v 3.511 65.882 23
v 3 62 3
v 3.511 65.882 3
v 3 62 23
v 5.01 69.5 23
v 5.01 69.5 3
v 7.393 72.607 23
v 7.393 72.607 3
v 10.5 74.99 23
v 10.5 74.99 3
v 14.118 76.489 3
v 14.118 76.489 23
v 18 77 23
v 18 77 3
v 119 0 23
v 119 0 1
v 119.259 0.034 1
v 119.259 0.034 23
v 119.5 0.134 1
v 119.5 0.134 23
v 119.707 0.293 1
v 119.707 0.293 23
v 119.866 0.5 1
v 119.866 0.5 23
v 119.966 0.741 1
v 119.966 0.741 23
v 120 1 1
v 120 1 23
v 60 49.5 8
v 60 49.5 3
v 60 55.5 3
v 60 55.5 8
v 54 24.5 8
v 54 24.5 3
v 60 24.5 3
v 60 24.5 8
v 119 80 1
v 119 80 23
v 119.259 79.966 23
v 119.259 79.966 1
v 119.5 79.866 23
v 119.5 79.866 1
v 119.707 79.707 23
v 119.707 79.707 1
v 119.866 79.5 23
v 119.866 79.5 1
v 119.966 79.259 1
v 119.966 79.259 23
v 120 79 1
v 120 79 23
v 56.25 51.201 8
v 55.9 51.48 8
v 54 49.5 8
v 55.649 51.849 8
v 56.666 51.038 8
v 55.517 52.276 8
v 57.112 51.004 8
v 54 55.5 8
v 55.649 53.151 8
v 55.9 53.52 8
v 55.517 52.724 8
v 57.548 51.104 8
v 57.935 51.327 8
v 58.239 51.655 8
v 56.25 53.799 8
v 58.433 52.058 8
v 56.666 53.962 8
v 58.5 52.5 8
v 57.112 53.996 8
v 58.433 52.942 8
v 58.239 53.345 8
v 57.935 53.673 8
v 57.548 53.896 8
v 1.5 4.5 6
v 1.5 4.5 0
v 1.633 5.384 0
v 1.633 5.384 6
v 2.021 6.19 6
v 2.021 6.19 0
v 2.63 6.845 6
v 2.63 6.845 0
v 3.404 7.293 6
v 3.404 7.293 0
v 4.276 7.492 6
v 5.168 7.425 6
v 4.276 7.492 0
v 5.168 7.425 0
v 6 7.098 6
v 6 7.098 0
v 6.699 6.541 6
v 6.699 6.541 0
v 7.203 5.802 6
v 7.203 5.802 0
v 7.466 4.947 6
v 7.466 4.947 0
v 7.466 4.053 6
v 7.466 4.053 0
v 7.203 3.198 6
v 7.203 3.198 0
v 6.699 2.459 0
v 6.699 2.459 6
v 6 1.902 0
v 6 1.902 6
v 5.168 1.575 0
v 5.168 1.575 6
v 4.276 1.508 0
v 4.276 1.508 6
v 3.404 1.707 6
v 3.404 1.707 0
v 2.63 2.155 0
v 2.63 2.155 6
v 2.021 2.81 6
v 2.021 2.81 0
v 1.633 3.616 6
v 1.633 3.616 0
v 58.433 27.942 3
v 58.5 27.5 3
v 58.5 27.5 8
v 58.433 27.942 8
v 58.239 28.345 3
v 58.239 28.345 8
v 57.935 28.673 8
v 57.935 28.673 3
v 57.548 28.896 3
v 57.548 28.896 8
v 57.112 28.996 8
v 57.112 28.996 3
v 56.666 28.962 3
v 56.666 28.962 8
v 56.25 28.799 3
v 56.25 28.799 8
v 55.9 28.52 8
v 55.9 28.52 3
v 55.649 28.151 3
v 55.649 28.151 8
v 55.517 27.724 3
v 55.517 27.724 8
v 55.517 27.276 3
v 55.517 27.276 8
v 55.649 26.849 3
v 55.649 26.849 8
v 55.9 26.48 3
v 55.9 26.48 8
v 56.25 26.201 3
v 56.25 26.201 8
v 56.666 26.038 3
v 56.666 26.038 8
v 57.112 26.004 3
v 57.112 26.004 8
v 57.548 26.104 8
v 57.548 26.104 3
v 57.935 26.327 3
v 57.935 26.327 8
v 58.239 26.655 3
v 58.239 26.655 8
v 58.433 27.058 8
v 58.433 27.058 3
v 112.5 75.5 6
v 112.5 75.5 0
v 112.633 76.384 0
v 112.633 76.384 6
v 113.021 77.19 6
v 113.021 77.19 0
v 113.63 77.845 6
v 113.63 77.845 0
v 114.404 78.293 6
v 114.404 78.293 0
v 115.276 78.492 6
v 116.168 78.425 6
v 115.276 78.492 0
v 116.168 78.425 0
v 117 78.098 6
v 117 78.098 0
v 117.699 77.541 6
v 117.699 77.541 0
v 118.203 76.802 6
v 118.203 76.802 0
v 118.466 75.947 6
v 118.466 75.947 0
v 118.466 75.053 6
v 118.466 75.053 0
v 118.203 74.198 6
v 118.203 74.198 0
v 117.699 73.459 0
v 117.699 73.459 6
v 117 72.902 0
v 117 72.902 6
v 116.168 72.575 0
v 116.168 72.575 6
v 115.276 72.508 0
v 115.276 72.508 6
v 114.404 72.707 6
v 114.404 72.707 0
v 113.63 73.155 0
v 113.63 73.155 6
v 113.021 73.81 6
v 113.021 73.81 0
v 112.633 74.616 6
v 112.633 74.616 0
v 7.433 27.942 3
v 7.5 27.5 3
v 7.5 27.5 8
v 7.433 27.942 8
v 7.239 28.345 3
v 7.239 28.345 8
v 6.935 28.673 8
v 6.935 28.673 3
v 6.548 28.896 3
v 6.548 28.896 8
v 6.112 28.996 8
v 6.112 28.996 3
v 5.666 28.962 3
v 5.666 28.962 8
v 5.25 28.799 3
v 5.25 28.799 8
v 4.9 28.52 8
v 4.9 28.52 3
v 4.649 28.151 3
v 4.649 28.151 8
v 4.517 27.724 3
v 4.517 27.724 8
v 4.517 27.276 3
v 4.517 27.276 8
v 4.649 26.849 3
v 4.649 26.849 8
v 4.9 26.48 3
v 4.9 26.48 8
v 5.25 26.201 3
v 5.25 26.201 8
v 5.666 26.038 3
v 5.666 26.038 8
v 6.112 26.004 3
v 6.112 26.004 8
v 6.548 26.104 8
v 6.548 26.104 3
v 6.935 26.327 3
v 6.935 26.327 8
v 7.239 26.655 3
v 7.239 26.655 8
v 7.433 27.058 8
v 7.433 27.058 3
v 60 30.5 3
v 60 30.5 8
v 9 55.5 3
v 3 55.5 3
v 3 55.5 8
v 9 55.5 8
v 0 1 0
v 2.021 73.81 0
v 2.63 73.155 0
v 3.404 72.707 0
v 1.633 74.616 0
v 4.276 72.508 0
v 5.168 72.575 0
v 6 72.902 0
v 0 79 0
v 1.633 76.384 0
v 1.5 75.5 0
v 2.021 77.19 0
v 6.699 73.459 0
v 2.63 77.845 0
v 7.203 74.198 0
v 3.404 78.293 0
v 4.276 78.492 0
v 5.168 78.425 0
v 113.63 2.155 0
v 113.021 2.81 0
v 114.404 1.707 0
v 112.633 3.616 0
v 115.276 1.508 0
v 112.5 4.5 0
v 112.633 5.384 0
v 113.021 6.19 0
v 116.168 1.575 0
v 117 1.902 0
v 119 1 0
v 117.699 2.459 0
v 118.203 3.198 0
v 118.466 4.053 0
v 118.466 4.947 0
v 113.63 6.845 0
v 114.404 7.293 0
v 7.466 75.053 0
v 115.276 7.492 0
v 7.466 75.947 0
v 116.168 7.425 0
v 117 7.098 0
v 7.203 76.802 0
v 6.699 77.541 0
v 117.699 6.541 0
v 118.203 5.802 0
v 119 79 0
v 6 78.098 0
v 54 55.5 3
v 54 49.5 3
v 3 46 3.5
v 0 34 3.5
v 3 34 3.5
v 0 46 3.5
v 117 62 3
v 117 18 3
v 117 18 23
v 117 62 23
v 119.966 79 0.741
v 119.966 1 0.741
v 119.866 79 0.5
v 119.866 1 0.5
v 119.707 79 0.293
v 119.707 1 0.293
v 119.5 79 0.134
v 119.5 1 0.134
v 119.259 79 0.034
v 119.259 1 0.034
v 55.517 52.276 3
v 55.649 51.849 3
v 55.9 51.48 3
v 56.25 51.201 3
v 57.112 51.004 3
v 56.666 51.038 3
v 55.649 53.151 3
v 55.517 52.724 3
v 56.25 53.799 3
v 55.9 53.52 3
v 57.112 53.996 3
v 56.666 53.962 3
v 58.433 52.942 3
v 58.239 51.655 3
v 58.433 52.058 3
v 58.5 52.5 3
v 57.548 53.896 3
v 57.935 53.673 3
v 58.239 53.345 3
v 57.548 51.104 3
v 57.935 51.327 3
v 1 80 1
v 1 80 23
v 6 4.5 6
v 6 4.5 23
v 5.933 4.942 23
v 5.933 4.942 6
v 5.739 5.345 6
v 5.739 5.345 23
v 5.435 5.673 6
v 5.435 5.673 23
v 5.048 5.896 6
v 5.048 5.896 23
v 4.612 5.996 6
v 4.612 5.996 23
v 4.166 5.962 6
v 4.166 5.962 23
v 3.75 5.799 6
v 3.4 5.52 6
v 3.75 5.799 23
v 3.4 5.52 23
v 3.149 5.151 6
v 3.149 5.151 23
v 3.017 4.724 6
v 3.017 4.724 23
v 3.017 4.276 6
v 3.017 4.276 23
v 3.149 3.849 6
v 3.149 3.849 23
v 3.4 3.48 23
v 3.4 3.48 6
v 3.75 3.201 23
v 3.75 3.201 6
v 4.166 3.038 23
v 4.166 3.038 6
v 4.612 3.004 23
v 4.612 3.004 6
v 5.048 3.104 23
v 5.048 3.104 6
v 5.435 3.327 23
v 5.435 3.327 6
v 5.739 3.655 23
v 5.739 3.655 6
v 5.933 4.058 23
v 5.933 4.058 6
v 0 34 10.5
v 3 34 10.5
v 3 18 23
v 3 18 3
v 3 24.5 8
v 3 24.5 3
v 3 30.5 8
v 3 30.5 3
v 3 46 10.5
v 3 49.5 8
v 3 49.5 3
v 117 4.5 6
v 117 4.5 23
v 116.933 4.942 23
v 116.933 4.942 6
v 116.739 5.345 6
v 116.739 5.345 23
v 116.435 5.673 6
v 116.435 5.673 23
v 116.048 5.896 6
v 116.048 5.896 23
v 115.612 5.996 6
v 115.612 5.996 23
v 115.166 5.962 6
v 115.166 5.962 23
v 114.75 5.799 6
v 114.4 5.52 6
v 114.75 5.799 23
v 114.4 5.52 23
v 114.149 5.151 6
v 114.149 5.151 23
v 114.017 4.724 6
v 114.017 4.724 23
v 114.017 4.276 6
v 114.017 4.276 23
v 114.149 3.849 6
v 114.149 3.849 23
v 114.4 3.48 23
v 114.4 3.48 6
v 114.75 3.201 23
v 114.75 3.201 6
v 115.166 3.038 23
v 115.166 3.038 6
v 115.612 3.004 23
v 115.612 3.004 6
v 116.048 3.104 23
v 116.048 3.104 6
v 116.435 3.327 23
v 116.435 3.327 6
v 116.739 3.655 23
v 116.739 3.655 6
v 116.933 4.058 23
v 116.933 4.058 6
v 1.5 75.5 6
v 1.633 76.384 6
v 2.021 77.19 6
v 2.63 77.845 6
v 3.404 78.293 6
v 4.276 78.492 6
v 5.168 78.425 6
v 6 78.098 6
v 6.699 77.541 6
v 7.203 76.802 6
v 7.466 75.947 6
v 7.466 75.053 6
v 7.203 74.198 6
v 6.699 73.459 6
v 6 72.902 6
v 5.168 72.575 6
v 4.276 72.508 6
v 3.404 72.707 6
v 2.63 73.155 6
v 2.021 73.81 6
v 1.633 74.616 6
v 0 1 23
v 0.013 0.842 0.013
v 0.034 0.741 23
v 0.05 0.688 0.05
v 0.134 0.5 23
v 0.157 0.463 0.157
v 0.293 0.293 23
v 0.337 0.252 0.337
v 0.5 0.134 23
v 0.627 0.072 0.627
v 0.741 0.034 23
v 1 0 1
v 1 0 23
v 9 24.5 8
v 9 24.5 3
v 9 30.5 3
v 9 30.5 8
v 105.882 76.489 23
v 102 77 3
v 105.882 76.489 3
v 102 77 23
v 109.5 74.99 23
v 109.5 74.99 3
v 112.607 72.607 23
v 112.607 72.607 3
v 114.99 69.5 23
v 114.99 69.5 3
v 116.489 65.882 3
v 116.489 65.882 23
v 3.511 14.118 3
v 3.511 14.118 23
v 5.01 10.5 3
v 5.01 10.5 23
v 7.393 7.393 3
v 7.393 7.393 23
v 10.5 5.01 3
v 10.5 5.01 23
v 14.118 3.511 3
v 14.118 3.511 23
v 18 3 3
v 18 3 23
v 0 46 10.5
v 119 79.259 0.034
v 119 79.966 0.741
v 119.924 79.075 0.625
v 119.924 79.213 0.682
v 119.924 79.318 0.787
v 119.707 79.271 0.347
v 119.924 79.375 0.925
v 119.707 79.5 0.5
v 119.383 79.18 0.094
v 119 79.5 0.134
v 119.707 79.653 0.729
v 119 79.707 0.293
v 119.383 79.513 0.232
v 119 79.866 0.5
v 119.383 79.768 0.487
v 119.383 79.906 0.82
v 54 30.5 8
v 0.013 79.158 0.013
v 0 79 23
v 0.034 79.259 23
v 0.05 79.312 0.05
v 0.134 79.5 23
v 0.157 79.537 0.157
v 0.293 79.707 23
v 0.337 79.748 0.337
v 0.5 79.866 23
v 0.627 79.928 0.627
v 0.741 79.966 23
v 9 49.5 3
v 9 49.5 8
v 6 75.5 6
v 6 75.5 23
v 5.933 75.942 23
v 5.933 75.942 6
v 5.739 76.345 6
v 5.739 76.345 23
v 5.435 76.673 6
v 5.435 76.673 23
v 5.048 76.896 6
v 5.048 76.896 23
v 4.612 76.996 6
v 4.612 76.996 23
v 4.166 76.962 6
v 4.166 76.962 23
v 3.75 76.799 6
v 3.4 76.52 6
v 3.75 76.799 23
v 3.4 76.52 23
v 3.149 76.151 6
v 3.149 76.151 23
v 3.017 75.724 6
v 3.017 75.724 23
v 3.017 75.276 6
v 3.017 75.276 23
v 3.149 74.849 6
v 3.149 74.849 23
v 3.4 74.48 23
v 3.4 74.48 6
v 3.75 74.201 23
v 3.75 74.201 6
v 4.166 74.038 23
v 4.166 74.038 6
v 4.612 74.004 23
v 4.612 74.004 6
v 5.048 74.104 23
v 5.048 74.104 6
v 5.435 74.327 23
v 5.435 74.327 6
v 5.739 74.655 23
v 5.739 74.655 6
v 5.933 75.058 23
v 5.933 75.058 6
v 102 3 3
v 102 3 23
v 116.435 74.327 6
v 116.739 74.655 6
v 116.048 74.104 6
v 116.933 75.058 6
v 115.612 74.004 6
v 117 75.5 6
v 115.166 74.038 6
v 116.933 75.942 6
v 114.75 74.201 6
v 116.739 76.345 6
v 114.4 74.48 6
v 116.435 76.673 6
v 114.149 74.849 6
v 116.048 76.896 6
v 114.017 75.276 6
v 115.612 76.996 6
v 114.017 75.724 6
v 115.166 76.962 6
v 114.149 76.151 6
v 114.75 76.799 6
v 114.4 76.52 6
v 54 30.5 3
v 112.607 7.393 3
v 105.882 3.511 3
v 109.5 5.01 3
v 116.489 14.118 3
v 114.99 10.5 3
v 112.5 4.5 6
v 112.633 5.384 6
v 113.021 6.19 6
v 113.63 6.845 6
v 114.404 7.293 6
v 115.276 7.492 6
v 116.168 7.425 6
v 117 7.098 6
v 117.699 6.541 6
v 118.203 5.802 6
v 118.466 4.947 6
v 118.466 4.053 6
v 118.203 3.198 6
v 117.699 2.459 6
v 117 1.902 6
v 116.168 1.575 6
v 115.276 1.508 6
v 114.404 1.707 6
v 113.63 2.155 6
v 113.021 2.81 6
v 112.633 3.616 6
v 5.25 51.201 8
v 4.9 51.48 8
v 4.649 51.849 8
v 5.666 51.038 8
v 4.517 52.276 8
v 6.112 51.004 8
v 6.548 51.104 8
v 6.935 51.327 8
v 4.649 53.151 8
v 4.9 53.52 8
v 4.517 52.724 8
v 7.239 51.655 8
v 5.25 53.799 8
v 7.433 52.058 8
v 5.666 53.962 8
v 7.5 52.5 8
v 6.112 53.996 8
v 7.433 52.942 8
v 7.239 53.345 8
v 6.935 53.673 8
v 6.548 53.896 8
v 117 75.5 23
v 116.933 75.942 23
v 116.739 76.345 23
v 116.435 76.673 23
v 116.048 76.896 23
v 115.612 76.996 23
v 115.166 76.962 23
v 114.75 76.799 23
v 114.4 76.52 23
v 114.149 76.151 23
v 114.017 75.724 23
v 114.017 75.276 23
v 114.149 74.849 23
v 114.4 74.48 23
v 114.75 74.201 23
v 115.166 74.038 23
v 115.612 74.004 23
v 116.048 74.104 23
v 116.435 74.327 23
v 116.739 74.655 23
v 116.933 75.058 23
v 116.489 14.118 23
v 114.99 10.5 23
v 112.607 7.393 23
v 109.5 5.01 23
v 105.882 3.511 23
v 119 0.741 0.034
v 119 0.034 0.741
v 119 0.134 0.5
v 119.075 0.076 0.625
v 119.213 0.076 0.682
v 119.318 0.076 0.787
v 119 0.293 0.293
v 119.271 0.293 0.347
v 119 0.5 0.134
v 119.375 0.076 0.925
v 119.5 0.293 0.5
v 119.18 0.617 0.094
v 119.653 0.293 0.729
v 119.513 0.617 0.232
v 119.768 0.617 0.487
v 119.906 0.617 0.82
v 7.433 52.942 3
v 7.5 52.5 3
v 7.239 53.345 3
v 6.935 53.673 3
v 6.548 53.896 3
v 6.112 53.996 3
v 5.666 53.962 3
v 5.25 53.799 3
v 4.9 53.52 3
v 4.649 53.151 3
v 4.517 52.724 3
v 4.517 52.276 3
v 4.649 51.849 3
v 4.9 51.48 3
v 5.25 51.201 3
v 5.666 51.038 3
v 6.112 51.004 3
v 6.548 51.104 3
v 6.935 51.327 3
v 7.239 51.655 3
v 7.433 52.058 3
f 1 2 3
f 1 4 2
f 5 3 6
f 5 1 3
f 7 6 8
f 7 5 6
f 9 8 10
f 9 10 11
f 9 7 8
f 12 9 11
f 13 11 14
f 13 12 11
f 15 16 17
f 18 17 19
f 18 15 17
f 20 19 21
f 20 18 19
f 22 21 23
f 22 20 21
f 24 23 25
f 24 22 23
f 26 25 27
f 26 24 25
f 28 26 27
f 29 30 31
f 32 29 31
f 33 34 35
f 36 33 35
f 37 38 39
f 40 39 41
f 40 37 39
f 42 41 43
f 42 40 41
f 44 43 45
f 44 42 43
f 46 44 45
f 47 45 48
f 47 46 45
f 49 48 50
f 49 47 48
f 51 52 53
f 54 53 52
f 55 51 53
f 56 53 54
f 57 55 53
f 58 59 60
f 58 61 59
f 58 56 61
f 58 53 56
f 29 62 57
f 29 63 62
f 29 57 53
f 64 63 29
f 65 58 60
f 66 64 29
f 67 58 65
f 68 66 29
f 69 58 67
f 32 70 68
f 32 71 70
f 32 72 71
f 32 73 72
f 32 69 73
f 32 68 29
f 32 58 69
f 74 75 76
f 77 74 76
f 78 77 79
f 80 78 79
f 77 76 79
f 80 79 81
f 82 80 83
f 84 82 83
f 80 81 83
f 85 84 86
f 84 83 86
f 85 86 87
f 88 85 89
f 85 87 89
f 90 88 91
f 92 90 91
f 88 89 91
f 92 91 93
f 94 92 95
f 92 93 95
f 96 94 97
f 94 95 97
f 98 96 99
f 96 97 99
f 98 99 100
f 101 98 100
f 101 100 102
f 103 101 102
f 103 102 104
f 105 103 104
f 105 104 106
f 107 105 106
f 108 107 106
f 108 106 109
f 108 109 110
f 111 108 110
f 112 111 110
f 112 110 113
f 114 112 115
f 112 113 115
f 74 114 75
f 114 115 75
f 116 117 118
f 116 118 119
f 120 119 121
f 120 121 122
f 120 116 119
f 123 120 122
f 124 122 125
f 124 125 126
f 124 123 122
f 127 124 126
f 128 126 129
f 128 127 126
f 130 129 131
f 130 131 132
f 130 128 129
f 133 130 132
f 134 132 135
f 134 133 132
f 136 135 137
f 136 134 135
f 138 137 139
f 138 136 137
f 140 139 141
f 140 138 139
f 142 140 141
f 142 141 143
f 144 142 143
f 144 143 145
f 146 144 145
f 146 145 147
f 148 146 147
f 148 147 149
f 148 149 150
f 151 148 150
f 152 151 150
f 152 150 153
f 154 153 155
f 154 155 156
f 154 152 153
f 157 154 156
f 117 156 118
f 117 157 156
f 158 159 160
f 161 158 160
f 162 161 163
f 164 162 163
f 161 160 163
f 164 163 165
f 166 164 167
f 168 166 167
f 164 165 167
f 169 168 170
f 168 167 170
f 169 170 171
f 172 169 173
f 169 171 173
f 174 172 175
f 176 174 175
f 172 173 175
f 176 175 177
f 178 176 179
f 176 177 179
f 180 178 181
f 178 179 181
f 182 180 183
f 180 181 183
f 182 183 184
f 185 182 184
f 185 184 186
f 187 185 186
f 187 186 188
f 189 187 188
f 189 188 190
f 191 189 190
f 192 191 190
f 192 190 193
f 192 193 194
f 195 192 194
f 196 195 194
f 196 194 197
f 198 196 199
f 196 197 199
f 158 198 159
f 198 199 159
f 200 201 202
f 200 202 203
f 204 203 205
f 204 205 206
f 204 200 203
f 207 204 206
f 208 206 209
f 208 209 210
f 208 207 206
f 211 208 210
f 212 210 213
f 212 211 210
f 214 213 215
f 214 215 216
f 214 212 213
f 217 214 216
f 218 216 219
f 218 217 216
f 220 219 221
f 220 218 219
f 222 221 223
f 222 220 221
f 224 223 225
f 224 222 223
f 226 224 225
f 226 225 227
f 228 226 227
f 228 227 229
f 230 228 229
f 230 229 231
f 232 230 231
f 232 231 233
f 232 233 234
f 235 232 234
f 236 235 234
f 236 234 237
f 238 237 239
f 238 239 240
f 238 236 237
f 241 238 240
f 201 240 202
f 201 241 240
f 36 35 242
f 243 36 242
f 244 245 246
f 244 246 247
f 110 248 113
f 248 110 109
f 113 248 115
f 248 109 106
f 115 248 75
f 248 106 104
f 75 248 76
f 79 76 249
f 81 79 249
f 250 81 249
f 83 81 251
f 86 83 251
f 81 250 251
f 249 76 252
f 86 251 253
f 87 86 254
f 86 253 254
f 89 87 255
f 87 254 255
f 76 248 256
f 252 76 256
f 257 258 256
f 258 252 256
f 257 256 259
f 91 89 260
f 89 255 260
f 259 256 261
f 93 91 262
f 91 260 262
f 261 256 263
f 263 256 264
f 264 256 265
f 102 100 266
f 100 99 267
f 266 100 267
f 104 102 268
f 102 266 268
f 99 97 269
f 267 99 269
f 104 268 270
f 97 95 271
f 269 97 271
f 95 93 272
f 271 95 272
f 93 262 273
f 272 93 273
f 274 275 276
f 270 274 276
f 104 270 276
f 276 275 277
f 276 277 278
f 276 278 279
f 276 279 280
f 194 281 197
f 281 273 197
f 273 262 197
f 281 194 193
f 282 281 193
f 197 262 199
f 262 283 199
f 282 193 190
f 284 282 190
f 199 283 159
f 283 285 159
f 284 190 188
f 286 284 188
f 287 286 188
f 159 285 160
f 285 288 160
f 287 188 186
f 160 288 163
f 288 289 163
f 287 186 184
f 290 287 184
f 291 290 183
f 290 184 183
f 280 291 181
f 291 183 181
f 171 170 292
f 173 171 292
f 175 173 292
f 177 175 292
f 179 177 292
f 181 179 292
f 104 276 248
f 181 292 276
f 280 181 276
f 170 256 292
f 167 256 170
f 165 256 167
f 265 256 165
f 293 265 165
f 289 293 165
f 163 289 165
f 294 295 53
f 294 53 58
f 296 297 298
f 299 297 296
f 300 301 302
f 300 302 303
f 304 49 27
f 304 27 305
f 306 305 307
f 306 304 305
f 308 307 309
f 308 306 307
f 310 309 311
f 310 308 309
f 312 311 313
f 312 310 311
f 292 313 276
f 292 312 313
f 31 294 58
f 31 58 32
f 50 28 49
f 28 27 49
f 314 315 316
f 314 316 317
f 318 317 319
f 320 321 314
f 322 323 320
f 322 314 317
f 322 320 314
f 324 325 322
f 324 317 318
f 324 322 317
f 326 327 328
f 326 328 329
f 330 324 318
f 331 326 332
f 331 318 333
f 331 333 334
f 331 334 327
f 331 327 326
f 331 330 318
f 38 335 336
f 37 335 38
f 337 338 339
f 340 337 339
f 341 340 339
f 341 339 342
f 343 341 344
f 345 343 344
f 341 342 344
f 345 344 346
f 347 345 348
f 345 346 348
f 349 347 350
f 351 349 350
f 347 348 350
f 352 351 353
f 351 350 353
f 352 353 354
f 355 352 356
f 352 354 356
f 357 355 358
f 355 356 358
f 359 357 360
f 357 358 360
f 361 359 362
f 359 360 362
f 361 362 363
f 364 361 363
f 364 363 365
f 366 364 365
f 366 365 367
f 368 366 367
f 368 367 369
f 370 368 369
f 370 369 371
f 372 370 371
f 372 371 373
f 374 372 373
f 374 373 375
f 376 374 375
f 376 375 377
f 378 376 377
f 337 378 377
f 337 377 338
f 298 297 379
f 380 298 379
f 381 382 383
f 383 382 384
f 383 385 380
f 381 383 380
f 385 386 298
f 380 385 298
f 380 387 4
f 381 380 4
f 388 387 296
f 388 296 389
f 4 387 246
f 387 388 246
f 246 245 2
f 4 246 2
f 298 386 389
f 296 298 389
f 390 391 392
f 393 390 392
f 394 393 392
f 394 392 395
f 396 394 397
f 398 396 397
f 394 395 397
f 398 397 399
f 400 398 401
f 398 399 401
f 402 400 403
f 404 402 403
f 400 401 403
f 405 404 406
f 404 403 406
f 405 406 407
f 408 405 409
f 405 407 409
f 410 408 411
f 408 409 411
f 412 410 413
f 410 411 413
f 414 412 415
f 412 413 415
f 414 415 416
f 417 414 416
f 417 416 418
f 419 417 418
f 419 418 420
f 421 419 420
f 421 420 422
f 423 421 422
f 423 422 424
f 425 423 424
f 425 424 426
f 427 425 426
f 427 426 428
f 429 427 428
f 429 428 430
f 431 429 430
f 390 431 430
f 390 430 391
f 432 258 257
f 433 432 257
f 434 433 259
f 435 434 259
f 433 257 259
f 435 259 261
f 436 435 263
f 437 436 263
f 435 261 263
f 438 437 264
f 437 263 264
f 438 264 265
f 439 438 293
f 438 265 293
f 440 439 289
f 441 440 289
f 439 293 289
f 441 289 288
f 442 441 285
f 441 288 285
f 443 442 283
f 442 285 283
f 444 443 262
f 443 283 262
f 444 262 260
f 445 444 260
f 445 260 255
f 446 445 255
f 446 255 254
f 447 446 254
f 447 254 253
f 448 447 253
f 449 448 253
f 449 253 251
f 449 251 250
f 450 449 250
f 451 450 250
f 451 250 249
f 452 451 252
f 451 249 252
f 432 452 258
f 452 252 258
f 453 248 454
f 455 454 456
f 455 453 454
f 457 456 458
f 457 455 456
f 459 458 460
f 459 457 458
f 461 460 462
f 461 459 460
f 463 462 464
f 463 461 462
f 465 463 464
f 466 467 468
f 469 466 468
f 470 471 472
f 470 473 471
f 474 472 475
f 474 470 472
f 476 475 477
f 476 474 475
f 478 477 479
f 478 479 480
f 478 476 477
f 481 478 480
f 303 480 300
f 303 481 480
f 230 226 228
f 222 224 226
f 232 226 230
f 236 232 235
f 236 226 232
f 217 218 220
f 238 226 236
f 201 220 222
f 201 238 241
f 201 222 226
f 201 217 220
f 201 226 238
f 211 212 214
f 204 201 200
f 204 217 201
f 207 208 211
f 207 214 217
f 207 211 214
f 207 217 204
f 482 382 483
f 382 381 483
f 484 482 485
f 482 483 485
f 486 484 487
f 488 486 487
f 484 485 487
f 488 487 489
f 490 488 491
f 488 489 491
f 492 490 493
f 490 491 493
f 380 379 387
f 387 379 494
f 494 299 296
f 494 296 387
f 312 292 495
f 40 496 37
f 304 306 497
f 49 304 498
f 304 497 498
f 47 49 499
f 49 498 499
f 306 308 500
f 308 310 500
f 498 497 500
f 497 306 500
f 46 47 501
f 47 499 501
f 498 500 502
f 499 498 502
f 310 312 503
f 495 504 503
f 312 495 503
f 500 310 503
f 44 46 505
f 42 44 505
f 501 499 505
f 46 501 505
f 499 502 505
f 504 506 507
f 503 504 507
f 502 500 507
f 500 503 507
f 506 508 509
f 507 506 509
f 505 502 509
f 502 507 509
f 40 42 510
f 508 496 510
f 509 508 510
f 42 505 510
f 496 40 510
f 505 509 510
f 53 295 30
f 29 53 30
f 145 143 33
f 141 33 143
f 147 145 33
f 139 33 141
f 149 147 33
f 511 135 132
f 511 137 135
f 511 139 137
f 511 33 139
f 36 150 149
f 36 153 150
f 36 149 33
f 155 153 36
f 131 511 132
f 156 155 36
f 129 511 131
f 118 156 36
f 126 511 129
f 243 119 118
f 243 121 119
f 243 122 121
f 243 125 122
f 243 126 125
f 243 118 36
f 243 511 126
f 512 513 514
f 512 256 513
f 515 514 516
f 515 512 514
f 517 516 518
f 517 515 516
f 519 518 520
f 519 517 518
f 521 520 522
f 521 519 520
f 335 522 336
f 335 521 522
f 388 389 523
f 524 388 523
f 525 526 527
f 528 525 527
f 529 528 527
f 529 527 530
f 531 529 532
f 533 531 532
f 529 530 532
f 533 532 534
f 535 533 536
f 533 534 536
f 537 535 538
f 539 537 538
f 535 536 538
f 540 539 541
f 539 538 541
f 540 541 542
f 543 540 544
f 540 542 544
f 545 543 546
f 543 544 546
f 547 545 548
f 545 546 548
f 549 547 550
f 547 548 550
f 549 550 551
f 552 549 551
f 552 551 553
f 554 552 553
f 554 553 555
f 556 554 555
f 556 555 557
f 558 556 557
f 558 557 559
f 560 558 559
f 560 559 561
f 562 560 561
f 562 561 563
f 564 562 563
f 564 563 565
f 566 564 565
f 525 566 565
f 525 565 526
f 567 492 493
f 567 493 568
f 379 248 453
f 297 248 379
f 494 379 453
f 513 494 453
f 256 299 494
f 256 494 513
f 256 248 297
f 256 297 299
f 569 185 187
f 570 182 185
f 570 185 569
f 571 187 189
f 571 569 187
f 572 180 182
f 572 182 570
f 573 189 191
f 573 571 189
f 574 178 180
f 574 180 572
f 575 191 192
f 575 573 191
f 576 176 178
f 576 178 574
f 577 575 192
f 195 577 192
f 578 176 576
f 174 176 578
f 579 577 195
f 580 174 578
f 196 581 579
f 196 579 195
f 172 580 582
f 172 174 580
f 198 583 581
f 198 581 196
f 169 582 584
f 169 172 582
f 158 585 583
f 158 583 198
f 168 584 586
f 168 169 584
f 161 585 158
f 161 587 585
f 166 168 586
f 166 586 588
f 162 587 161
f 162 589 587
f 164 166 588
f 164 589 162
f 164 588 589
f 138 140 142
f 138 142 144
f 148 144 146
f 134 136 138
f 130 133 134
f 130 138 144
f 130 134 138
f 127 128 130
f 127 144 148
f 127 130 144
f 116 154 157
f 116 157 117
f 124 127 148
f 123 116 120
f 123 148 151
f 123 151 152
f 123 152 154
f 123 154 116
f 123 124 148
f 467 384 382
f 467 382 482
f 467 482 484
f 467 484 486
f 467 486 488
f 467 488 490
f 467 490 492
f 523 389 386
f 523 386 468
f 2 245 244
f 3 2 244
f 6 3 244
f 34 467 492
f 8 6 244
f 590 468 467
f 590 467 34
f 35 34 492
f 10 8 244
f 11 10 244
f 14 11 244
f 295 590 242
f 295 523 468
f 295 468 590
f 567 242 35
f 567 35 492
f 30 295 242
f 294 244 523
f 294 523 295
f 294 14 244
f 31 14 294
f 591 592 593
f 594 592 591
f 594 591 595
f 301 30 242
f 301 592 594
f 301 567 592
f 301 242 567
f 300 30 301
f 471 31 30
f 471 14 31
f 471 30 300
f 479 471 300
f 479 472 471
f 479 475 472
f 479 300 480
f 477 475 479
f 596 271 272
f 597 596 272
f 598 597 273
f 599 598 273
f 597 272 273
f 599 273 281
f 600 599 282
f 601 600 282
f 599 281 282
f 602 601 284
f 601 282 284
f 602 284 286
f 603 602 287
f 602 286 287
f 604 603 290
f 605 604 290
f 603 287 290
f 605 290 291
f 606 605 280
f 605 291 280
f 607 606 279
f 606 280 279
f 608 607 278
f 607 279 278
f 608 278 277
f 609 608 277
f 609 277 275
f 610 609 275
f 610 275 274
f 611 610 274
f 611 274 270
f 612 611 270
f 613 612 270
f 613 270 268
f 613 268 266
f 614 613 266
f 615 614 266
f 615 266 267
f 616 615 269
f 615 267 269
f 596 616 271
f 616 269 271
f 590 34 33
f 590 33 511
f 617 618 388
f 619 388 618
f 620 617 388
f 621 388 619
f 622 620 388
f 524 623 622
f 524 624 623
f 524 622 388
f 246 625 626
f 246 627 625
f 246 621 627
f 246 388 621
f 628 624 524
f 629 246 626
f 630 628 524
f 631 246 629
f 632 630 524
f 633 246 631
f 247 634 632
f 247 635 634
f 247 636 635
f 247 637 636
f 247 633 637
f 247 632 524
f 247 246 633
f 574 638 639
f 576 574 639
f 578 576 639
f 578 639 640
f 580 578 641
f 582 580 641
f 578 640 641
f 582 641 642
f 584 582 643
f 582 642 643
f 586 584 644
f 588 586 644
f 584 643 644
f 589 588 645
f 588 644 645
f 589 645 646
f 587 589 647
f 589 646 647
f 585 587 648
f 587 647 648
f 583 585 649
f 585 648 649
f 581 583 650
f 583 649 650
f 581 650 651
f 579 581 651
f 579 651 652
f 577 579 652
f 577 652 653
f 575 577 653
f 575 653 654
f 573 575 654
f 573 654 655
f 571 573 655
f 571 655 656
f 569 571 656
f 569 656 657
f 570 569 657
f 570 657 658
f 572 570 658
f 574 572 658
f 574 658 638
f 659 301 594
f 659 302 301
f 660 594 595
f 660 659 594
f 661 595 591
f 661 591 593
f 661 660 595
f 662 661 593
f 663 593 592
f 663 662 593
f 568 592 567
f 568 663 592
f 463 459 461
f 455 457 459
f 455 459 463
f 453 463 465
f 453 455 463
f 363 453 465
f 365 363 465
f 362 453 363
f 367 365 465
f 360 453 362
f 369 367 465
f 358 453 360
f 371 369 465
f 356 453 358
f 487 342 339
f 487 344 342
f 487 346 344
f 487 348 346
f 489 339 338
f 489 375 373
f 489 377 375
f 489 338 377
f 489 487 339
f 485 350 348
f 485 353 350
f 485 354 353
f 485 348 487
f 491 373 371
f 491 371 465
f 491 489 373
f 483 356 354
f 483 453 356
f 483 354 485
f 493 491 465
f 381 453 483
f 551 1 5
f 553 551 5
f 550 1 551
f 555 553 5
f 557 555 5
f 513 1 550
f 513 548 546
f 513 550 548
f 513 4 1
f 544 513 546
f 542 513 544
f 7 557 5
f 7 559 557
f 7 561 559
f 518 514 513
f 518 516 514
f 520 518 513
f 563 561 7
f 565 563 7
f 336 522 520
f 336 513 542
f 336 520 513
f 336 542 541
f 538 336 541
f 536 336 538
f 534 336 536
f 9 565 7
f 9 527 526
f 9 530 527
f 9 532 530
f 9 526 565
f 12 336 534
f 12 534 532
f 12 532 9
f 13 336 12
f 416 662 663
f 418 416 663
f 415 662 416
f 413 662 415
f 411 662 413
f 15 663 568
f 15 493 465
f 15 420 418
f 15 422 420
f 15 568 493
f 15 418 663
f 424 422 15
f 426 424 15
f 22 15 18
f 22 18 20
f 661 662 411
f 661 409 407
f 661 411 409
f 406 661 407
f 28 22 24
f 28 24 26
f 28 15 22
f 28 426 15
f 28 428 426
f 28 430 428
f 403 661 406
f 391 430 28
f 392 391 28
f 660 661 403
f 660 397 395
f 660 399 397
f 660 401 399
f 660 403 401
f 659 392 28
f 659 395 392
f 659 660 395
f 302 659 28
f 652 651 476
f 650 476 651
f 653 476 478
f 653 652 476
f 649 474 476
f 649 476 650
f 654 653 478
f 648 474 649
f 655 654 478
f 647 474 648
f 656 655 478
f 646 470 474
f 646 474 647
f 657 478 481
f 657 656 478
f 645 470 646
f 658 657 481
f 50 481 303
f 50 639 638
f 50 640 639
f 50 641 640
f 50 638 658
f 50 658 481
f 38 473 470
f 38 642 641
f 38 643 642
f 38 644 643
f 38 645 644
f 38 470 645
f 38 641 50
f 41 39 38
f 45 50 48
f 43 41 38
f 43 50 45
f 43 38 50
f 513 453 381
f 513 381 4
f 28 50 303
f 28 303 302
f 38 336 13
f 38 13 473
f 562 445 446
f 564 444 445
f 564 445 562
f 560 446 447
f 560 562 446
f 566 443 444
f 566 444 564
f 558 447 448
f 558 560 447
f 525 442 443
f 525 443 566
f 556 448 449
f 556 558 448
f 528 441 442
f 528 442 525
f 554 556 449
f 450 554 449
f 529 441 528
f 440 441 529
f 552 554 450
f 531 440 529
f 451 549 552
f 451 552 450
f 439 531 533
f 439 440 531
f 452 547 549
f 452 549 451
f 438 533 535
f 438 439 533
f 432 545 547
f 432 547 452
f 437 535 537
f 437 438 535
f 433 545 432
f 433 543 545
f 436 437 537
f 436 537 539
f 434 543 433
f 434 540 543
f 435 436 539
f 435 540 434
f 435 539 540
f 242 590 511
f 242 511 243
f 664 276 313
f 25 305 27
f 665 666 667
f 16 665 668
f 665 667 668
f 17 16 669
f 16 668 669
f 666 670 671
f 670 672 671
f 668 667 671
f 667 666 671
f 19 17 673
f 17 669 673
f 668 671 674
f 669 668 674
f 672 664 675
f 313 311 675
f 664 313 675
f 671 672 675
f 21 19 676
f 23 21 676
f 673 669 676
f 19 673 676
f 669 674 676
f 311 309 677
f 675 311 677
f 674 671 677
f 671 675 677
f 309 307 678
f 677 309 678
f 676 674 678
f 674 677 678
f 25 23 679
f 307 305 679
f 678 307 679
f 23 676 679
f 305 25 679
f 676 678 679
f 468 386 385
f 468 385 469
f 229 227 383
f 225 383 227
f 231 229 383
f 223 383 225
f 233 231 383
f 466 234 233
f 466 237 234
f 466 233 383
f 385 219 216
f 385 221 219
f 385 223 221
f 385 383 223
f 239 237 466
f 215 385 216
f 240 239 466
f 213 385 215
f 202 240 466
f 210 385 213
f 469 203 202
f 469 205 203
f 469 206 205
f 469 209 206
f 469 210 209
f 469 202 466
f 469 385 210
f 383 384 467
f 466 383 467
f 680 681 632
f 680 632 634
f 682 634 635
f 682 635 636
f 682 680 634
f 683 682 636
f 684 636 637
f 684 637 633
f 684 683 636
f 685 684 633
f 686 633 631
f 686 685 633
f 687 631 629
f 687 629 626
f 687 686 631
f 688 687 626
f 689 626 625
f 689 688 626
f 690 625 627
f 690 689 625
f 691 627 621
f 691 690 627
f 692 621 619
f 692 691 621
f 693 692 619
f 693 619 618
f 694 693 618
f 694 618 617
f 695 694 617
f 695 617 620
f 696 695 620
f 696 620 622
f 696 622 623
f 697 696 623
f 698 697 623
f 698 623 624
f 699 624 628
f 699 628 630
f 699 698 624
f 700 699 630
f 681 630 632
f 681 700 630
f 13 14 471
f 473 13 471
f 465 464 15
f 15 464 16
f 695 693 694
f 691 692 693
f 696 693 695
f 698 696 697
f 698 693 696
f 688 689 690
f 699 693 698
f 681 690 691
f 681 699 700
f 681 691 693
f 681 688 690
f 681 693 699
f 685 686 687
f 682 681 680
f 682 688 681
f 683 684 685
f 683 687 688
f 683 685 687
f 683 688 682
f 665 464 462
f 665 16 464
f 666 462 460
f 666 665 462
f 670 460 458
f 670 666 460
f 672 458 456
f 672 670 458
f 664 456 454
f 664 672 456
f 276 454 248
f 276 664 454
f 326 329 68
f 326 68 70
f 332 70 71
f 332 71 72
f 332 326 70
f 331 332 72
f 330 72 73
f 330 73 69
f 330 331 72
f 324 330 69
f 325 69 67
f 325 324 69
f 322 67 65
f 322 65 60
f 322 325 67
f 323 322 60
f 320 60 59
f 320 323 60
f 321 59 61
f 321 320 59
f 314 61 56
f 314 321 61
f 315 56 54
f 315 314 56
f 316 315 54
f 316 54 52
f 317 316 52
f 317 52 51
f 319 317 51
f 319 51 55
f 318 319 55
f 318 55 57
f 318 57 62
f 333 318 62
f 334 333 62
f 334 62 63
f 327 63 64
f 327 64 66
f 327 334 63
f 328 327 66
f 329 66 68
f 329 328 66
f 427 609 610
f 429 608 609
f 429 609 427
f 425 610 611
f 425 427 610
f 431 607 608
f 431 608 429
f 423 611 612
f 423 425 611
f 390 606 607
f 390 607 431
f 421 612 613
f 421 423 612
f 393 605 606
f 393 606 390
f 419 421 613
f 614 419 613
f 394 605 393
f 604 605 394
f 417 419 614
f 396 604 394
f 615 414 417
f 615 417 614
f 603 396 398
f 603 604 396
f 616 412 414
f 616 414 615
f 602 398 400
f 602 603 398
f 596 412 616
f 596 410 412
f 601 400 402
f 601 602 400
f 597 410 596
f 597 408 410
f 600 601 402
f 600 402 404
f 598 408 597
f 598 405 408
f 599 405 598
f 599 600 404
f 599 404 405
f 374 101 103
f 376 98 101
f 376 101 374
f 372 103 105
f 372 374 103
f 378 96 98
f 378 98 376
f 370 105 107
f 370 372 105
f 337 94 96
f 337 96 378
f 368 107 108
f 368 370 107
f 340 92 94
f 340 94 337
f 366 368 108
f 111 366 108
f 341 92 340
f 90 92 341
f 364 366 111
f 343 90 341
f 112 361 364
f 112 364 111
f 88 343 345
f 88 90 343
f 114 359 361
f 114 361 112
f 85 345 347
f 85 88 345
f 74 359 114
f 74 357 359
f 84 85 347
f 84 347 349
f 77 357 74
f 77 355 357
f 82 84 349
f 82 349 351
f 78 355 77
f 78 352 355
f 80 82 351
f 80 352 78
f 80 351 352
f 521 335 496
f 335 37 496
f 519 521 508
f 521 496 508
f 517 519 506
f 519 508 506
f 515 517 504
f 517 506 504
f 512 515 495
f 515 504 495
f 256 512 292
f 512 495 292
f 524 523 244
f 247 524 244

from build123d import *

# Parameters (mm, degrees)
ESQUISSE1_W             = 120
ESQUISSE1_H             = 80
BOSS_EXTRU_1_DEPTH      = 3
ESQUISSE4_W             = 120
ESQUISSE4_H             = 80
ESQUISSE4_W_2           = 114
ESQUISSE4_H_2           = 74
BOSS_EXTRU_3_DEPTH      = 20
CONG_1_R                = 15
ESQUISSE5_R             = 1.5
ENL_V_MAT_EXTRU_1_DEPTH = 147.044513762
ESQUISSE7_R             = 3
ENL_V_MAT_EXTRU_3_DEPTH = 6
ESQUISSE8_W             = 6
ESQUISSE8_H             = 6
ESQUISSE8_R             = 1.5
BOSS_EXTRU_4_DEPTH      = 5
ENL_V_MAT_EXTRU_4_REACH = 148.045
ESQUISSE9_W             = 7
ESQUISSE9_H             = 12
CONG_3_R                = 1


with BuildPart() as part:
    # Esquisse1 → Boss.-Extru.1 (new body)
    with BuildSketch(Plane.XY):
        with Locations((60, 40)):
            Rectangle(ESQUISSE1_W, ESQUISSE1_H)
    extrude(amount=BOSS_EXTRU_1_DEPTH)

    # Esquisse4 → Boss.-Extru.3 (add)
    with BuildSketch(Plane.XY.offset(3)):
        with Locations((60, 40)):
            Rectangle(ESQUISSE4_W, ESQUISSE4_H)
        with Locations((60, 40)):
            Rectangle(ESQUISSE4_W_2, ESQUISSE4_H_2, mode=Mode.SUBTRACT)
    extrude(amount=BOSS_EXTRU_3_DEPTH)

    # Congé1
    cong_1_edges = [part.edges().sort_by_distance(p)[0] for p in [
        (3, 3, 13),
        (117, 3, 13),
        (117, 77, 13),
        (3, 77, 13),
    ]]
    fillet(cong_1_edges, radius=CONG_1_R)

    # Esquisse5 → Enlèv. mat.-Extru.1 (cut, through all)
    with BuildSketch(Plane.XY.offset(23)):
        with Locations((4.5, 75.5)):
            Circle(ESQUISSE5_R)
        with Locations((115.5, 75.5)):
            Circle(ESQUISSE5_R)
        with Locations((115.5, 4.5)):
            Circle(ESQUISSE5_R)
        with Locations((4.5, 4.5)):
            Circle(ESQUISSE5_R)
    extrude(amount=-ENL_V_MAT_EXTRU_1_DEPTH, mode=Mode.SUBTRACT)

    # Esquisse7 → Enlèv. mat.-Extru.3 (cut)
    with BuildSketch(Plane(origin=(0, 0, 0), x_dir=(-1, 0, 0), z_dir=(0, 0, -1))):
        with Locations((-115.5, 75.5)):
            Circle(ESQUISSE7_R)
        with Locations((-4.5, 75.5)):
            Circle(ESQUISSE7_R)
        with Locations((-4.5, 4.5)):
            Circle(ESQUISSE7_R)
        with Locations((-115.5, 4.5)):
            Circle(ESQUISSE7_R)
    extrude(amount=-ENL_V_MAT_EXTRU_3_DEPTH, mode=Mode.SUBTRACT)

    # Esquisse8 → Boss.-Extru.4 (add)
    # profile 1 of 4: a face of its own
    with BuildSketch(Plane.XY.offset(3)):
        with Locations((6, 52.5)):
            Rectangle(ESQUISSE8_W, ESQUISSE8_H)
        with Locations((6, 52.5)):
            Circle(ESQUISSE8_R, mode=Mode.SUBTRACT)
    # profile 2 of 4: a face of its own
    with BuildSketch(Plane.XY.offset(3)):
        with Locations((57, 52.5)):
            Rectangle(ESQUISSE8_W, ESQUISSE8_H)
        with Locations((57, 52.5)):
            Circle(ESQUISSE8_R, mode=Mode.SUBTRACT)
    # profile 3 of 4: a face of its own
    with BuildSketch(Plane.XY.offset(3)):
        with Locations((57, 27.5)):
            Rectangle(ESQUISSE8_W, ESQUISSE8_H)
        with Locations((57, 27.5)):
            Circle(ESQUISSE8_R, mode=Mode.SUBTRACT)
    # profile 4 of 4: a face of its own
    with BuildSketch(Plane.XY.offset(3)):
        with Locations((6, 27.5)):
            Rectangle(ESQUISSE8_W, ESQUISSE8_H)
        with Locations((6, 27.5)):
            Circle(ESQUISSE8_R, mode=Mode.SUBTRACT)
    extrude(amount=BOSS_EXTRU_4_DEPTH)

    # Esquisse9 → Enlèv. mat.-Extru.4 (cut, up to next)
    with BuildSketch(Plane.ZY, mode=Mode.PRIVATE) as enl_v_mat_extru_4_sk1:
        with Locations((7, 40)):
            Rectangle(ESQUISSE9_W, ESQUISSE9_H)
    enl_v_mat_extru_4_tool1 = extrude(enl_v_mat_extru_4_sk1.sketch, amount=-ENL_V_MAT_EXTRU_4_REACH, mode=Mode.PRIVATE) & part.part
    add(enl_v_mat_extru_4_tool1.solids().sort_by_distance((0, 40, 7))[0], mode=Mode.SUBTRACT)

    # Congé3
    cong_3_edges = [part.edges().sort_by_distance(p)[0] for p in [
        (60, 80, 0),
        (120, 40, 0),
        (60, 0, 0),
        (0, 80, 11.5),
        (120, 80, 11.5),
        (120, 0, 11.5),
        (0, 0, 11.5),
    ]]
    fillet(cong_3_edges, radius=CONG_3_R)


solid = part.part
